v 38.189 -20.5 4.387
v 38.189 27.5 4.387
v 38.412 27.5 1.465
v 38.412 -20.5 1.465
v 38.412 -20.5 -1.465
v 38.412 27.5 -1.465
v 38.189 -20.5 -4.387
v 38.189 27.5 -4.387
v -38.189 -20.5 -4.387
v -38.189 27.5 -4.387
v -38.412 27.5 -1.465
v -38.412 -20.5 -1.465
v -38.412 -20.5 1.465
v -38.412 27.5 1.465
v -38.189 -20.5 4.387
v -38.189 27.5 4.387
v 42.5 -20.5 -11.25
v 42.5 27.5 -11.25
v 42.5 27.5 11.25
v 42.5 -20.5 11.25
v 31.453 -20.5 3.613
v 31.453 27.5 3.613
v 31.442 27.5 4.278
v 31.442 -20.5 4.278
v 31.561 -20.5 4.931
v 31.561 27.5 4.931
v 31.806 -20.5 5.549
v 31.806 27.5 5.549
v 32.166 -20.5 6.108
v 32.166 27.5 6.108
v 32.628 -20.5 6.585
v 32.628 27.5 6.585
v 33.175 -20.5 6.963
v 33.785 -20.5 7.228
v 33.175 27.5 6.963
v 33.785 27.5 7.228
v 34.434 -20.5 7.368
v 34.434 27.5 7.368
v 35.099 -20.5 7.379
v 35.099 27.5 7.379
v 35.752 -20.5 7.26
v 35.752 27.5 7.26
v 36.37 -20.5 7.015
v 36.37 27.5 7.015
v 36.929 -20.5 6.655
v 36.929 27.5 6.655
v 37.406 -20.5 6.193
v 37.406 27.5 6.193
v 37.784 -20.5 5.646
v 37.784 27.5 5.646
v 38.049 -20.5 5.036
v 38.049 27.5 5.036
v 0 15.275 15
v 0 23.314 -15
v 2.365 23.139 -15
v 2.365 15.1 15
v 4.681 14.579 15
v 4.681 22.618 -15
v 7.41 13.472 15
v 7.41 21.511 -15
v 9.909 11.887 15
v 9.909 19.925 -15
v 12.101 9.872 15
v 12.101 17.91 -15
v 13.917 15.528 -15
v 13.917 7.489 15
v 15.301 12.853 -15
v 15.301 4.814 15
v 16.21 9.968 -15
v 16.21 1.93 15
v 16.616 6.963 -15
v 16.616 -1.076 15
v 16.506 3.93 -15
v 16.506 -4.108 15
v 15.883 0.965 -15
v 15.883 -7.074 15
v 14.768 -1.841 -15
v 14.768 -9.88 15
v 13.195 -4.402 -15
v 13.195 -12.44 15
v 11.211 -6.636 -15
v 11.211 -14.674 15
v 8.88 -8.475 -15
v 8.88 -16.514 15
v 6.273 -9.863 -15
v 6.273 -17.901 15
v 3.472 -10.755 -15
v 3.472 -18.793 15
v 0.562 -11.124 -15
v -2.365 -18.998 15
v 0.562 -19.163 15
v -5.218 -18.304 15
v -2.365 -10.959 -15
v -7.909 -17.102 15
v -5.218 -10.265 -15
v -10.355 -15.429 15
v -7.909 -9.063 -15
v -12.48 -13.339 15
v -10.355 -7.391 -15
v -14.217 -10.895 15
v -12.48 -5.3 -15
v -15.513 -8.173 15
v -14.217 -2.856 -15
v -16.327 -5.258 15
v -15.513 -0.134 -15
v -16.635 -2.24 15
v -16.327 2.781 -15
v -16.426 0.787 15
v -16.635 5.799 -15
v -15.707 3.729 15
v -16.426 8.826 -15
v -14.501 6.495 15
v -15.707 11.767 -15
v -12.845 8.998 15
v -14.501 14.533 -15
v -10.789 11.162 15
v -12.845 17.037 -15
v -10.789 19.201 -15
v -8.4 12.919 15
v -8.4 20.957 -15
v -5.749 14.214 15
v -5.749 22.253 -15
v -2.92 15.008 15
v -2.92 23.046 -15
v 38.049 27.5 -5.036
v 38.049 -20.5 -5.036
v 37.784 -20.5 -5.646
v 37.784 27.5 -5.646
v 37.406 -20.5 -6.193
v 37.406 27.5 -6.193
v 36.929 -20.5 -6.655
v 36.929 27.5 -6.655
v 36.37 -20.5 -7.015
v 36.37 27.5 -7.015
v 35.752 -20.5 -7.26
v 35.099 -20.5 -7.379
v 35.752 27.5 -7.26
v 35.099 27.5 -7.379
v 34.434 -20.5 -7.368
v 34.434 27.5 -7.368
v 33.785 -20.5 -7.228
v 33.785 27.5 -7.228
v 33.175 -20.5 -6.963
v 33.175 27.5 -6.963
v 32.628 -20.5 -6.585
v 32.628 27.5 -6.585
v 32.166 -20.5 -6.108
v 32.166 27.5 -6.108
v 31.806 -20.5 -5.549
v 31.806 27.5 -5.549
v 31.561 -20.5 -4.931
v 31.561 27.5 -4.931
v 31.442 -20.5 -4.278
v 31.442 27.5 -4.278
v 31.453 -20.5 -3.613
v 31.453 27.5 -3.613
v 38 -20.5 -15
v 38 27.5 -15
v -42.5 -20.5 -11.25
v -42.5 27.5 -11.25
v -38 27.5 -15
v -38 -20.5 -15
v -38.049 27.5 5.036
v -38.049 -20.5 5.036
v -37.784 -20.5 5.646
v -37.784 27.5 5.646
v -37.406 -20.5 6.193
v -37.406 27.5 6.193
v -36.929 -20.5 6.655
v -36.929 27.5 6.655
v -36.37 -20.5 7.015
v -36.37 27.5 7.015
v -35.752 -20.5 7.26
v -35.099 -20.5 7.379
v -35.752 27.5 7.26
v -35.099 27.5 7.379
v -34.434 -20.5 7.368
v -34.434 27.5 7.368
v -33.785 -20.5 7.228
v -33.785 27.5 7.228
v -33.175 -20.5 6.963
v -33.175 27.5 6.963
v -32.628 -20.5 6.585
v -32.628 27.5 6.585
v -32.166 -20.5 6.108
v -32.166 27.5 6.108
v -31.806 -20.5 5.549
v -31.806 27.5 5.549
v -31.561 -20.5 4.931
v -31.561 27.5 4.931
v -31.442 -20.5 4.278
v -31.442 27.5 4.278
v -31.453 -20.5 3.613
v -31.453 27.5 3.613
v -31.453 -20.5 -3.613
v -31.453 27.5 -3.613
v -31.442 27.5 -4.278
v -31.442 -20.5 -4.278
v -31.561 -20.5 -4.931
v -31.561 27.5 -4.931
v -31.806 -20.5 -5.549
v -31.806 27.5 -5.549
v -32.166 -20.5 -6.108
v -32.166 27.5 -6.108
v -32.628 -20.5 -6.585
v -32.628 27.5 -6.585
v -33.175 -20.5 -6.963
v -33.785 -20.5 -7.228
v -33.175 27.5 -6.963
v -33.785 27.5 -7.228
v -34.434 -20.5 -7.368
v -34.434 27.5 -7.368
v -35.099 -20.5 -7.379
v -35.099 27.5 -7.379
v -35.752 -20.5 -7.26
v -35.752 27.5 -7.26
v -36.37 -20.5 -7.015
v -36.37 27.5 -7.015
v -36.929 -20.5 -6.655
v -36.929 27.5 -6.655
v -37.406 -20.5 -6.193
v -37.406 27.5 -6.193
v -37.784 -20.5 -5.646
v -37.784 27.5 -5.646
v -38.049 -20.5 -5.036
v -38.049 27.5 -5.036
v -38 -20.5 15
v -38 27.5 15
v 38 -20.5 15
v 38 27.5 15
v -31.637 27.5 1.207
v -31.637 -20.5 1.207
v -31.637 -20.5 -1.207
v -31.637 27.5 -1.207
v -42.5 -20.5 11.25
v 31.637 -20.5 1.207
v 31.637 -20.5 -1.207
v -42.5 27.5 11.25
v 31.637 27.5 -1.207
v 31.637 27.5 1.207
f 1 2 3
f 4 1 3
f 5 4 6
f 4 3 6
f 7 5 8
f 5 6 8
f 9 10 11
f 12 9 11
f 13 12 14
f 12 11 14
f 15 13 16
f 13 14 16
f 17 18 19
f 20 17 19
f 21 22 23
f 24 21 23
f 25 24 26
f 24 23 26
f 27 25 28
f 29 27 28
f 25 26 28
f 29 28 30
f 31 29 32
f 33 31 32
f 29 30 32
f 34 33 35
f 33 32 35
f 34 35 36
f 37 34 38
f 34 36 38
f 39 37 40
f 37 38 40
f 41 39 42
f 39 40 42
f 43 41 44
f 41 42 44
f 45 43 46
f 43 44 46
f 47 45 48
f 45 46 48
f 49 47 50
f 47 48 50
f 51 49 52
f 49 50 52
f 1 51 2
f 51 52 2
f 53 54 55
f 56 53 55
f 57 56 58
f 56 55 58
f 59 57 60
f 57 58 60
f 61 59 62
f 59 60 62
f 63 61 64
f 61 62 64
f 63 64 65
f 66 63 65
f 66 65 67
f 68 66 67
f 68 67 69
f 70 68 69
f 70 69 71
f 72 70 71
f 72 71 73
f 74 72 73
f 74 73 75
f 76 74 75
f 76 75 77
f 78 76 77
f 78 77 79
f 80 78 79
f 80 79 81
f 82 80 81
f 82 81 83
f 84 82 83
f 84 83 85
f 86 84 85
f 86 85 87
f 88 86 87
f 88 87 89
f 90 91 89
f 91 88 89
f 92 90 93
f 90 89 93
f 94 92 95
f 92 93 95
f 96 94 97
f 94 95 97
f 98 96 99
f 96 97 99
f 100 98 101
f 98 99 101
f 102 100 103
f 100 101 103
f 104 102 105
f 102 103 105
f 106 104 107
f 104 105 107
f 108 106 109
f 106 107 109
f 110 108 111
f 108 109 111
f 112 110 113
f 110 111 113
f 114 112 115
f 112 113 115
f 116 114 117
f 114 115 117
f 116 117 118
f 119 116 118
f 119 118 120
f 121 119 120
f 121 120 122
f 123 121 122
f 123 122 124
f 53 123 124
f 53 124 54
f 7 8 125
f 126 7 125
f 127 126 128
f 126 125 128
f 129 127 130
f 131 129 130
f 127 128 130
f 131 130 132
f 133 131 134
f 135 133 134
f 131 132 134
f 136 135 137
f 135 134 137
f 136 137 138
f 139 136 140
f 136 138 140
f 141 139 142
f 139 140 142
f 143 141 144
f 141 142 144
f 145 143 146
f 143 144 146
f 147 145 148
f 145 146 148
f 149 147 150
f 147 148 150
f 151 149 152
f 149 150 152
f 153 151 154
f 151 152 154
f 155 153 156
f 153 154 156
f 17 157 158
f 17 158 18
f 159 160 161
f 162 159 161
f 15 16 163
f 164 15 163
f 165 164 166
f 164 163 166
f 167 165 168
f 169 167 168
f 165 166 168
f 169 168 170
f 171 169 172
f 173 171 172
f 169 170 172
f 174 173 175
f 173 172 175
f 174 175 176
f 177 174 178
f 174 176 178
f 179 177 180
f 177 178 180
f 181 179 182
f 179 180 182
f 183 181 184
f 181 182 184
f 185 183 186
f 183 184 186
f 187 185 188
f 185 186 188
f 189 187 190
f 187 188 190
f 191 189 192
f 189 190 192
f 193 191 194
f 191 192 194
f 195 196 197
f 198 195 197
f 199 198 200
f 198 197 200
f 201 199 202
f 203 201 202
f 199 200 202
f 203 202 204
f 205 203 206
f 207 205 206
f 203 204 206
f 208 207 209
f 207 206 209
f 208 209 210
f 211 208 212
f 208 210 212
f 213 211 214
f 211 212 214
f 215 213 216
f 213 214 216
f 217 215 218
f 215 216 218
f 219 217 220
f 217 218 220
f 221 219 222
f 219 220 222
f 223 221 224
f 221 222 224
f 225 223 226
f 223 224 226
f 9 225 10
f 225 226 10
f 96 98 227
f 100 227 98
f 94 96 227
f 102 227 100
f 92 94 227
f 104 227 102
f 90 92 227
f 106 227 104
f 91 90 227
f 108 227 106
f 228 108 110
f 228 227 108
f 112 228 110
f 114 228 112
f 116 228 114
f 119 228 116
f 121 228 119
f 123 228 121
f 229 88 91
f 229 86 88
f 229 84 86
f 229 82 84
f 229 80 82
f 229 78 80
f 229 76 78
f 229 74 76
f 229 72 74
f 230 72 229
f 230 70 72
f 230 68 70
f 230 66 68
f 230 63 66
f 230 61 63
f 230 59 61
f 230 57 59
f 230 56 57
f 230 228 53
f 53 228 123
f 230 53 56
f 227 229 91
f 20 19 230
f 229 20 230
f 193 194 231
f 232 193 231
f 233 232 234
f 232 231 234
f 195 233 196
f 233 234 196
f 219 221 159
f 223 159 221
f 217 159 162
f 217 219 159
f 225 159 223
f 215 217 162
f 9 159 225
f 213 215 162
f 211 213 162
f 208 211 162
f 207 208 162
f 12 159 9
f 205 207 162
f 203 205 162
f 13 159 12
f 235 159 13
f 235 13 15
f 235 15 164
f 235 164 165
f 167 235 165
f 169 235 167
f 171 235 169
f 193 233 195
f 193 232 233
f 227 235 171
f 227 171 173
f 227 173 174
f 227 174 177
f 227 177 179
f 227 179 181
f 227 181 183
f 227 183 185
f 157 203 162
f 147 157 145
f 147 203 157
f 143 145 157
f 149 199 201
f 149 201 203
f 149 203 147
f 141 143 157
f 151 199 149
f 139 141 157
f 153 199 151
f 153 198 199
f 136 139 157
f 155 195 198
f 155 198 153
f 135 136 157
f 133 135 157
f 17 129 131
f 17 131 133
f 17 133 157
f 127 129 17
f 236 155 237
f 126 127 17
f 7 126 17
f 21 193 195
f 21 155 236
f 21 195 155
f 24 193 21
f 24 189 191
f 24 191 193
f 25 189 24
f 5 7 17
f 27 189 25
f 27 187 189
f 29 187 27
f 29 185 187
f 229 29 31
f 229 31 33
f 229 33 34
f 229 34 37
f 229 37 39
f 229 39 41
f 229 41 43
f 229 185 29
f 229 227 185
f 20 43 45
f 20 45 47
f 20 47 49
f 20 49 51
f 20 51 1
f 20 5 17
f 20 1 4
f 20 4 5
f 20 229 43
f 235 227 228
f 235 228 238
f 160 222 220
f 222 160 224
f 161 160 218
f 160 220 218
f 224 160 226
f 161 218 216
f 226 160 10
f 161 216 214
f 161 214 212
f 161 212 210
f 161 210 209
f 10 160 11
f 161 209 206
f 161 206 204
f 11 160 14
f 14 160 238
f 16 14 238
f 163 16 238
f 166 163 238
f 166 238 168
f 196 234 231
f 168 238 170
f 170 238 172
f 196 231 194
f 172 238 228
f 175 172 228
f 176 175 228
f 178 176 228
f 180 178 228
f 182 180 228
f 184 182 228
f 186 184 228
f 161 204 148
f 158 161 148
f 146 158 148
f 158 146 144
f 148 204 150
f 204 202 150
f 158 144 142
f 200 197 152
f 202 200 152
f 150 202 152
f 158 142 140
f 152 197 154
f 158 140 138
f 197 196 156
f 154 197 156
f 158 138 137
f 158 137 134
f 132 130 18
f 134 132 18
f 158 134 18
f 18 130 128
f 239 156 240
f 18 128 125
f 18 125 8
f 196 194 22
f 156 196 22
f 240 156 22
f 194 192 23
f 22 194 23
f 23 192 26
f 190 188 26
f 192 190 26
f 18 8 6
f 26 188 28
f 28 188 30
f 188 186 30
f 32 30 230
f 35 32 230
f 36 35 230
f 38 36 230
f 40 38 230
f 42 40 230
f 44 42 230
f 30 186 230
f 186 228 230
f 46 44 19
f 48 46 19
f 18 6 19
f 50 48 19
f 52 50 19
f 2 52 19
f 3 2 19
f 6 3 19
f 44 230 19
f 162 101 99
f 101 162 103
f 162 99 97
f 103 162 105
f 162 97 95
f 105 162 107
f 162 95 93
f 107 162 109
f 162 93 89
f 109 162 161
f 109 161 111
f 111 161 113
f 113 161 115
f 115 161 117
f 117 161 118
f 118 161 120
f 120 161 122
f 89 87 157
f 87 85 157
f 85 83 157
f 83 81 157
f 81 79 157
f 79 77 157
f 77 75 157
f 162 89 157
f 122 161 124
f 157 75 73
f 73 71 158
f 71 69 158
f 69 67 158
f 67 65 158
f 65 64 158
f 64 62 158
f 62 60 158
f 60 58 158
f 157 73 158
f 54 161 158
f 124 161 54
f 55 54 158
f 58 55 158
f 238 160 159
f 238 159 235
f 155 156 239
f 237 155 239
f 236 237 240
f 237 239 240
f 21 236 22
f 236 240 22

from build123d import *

# Parameters (mm, degrees)
SKETCH2_W           = 100
SKETCH2_H           = 55
BOSS_EXTRUDE1_DEPTH = 15
CUT_EXTRUDE2_DEPTH  = 76.828754441
SKETCH9_R           = 16.637
CUT_EXTRUDE3_DEPTH  = 70.869600016
CUT_EXTRUDE4_DEPTH  = 76.828754441
CUT_EXTRUDE5_DEPTH  = 76.828754441
SKETCH12_W          = 91
SKETCH12_H          = 35
CUT_EXTRUDE6_DEPTH  = 7


with BuildPart() as part:
    # Sketch2 → Boss-Extrude1 (new, symmetric)
    with BuildSketch(Plane.XY):
        Rectangle(SKETCH2_W, SKETCH2_H)
    extrude(amount=BOSS_EXTRUDE1_DEPTH, both=True)

    # Sketch5 → Cut-Extrude2 (cut, through all)
    with BuildSketch(Plane(origin=(0, 27.5, 0), x_dir=(1, 0, 0), z_dir=(0, 1, 0))):
        with BuildLine():
            ThreePointArc((-38.188858584, 4.386875892), (-38.44, 0), (-38.188858584, -4.386875892))
            ThreePointArc((-38.188858584, -4.386875892), (-34.434130699, -7.367851993), (-31.453154598, -3.613124108))
            ThreePointArc((-31.453154598, -3.613124108), (-31.66, 0), (-31.453154598, 3.613124108))
            ThreePointArc((-31.453154598, 3.613124108), (-34.434130699, 7.367851993), (-38.188858584, 4.386875892))
        make_face()
        with BuildLine():
            ThreePointArc((38.188858584, -4.386875892), (38.44, 0), (38.188858584, 4.386875892))
            ThreePointArc((38.188858584, 4.386875892), (34.434130699, 7.367851993), (31.453154598, 3.613124108))
            ThreePointArc((31.453154598, 3.613124108), (31.66, 0), (31.453154598, -3.613124108))
            ThreePointArc((31.453154598, -3.613124108), (34.434130699, -7.367851993), (38.188858584, -4.386875892))
        make_face()
    extrude(amount=-CUT_EXTRUDE2_DEPTH, mode=Mode.SUBTRACT)

    # Sketch9 → Cut-Extrude3 (cut, through all)
    with BuildSketch(Plane(origin=(0, 5.592150698, -20.870190528), x_dir=(-1, 0, 0), z_dir=(0, 0.25881904510252135, -0.9659258262890681))):
        with Locations(Location((0, 2, 0), (0, 0, 90))):
            Circle(SKETCH9_R)
    extrude(amount=-CUT_EXTRUDE3_DEPTH, mode=Mode.SUBTRACT)

    # Sketch10 → Cut-Extrude4 (cut, through all)
    with BuildSketch(Plane(origin=(0, 27.5, 0), x_dir=(1, 0, 0), z_dir=(0, 1, 0))):
        Polygon((50, 5), (50, 15), (38, 15), align=None)
        Polygon((50, -15), (50, -5), (38, -15), align=None)
        Polygon((-38, -15), (-50, -5), (-50, -15), align=None)
        Polygon((-50, 5), (-38, 15), (-50, 15), align=None)
    extrude(amount=-CUT_EXTRUDE4_DEPTH, mode=Mode.SUBTRACT)

    # Sketch11 → Cut-Extrude5 (cut, through all)
    with BuildSketch(Plane(origin=(0, 27.5, 0), x_dir=(1, 0, 0), z_dir=(0, 1, 0))):
        Polygon((-42.5, 11.25), (-42.5, -11.25), (-50, -5), (-50, 5), align=None)
        Polygon((42.5, 11.25), (42.5, -11.25), (50, -5), (50, 5), align=None)
    extrude(amount=-CUT_EXTRUDE5_DEPTH, mode=Mode.SUBTRACT)

    # Sketch12 → Cut-Extrude6 (cut)
    with BuildSketch(Plane.XZ.offset(27.5)):
        Rectangle(SKETCH12_W, SKETCH12_H)
    extrude(amount=-CUT_EXTRUDE6_DEPTH, mode=Mode.SUBTRACT)


solid = part.part
